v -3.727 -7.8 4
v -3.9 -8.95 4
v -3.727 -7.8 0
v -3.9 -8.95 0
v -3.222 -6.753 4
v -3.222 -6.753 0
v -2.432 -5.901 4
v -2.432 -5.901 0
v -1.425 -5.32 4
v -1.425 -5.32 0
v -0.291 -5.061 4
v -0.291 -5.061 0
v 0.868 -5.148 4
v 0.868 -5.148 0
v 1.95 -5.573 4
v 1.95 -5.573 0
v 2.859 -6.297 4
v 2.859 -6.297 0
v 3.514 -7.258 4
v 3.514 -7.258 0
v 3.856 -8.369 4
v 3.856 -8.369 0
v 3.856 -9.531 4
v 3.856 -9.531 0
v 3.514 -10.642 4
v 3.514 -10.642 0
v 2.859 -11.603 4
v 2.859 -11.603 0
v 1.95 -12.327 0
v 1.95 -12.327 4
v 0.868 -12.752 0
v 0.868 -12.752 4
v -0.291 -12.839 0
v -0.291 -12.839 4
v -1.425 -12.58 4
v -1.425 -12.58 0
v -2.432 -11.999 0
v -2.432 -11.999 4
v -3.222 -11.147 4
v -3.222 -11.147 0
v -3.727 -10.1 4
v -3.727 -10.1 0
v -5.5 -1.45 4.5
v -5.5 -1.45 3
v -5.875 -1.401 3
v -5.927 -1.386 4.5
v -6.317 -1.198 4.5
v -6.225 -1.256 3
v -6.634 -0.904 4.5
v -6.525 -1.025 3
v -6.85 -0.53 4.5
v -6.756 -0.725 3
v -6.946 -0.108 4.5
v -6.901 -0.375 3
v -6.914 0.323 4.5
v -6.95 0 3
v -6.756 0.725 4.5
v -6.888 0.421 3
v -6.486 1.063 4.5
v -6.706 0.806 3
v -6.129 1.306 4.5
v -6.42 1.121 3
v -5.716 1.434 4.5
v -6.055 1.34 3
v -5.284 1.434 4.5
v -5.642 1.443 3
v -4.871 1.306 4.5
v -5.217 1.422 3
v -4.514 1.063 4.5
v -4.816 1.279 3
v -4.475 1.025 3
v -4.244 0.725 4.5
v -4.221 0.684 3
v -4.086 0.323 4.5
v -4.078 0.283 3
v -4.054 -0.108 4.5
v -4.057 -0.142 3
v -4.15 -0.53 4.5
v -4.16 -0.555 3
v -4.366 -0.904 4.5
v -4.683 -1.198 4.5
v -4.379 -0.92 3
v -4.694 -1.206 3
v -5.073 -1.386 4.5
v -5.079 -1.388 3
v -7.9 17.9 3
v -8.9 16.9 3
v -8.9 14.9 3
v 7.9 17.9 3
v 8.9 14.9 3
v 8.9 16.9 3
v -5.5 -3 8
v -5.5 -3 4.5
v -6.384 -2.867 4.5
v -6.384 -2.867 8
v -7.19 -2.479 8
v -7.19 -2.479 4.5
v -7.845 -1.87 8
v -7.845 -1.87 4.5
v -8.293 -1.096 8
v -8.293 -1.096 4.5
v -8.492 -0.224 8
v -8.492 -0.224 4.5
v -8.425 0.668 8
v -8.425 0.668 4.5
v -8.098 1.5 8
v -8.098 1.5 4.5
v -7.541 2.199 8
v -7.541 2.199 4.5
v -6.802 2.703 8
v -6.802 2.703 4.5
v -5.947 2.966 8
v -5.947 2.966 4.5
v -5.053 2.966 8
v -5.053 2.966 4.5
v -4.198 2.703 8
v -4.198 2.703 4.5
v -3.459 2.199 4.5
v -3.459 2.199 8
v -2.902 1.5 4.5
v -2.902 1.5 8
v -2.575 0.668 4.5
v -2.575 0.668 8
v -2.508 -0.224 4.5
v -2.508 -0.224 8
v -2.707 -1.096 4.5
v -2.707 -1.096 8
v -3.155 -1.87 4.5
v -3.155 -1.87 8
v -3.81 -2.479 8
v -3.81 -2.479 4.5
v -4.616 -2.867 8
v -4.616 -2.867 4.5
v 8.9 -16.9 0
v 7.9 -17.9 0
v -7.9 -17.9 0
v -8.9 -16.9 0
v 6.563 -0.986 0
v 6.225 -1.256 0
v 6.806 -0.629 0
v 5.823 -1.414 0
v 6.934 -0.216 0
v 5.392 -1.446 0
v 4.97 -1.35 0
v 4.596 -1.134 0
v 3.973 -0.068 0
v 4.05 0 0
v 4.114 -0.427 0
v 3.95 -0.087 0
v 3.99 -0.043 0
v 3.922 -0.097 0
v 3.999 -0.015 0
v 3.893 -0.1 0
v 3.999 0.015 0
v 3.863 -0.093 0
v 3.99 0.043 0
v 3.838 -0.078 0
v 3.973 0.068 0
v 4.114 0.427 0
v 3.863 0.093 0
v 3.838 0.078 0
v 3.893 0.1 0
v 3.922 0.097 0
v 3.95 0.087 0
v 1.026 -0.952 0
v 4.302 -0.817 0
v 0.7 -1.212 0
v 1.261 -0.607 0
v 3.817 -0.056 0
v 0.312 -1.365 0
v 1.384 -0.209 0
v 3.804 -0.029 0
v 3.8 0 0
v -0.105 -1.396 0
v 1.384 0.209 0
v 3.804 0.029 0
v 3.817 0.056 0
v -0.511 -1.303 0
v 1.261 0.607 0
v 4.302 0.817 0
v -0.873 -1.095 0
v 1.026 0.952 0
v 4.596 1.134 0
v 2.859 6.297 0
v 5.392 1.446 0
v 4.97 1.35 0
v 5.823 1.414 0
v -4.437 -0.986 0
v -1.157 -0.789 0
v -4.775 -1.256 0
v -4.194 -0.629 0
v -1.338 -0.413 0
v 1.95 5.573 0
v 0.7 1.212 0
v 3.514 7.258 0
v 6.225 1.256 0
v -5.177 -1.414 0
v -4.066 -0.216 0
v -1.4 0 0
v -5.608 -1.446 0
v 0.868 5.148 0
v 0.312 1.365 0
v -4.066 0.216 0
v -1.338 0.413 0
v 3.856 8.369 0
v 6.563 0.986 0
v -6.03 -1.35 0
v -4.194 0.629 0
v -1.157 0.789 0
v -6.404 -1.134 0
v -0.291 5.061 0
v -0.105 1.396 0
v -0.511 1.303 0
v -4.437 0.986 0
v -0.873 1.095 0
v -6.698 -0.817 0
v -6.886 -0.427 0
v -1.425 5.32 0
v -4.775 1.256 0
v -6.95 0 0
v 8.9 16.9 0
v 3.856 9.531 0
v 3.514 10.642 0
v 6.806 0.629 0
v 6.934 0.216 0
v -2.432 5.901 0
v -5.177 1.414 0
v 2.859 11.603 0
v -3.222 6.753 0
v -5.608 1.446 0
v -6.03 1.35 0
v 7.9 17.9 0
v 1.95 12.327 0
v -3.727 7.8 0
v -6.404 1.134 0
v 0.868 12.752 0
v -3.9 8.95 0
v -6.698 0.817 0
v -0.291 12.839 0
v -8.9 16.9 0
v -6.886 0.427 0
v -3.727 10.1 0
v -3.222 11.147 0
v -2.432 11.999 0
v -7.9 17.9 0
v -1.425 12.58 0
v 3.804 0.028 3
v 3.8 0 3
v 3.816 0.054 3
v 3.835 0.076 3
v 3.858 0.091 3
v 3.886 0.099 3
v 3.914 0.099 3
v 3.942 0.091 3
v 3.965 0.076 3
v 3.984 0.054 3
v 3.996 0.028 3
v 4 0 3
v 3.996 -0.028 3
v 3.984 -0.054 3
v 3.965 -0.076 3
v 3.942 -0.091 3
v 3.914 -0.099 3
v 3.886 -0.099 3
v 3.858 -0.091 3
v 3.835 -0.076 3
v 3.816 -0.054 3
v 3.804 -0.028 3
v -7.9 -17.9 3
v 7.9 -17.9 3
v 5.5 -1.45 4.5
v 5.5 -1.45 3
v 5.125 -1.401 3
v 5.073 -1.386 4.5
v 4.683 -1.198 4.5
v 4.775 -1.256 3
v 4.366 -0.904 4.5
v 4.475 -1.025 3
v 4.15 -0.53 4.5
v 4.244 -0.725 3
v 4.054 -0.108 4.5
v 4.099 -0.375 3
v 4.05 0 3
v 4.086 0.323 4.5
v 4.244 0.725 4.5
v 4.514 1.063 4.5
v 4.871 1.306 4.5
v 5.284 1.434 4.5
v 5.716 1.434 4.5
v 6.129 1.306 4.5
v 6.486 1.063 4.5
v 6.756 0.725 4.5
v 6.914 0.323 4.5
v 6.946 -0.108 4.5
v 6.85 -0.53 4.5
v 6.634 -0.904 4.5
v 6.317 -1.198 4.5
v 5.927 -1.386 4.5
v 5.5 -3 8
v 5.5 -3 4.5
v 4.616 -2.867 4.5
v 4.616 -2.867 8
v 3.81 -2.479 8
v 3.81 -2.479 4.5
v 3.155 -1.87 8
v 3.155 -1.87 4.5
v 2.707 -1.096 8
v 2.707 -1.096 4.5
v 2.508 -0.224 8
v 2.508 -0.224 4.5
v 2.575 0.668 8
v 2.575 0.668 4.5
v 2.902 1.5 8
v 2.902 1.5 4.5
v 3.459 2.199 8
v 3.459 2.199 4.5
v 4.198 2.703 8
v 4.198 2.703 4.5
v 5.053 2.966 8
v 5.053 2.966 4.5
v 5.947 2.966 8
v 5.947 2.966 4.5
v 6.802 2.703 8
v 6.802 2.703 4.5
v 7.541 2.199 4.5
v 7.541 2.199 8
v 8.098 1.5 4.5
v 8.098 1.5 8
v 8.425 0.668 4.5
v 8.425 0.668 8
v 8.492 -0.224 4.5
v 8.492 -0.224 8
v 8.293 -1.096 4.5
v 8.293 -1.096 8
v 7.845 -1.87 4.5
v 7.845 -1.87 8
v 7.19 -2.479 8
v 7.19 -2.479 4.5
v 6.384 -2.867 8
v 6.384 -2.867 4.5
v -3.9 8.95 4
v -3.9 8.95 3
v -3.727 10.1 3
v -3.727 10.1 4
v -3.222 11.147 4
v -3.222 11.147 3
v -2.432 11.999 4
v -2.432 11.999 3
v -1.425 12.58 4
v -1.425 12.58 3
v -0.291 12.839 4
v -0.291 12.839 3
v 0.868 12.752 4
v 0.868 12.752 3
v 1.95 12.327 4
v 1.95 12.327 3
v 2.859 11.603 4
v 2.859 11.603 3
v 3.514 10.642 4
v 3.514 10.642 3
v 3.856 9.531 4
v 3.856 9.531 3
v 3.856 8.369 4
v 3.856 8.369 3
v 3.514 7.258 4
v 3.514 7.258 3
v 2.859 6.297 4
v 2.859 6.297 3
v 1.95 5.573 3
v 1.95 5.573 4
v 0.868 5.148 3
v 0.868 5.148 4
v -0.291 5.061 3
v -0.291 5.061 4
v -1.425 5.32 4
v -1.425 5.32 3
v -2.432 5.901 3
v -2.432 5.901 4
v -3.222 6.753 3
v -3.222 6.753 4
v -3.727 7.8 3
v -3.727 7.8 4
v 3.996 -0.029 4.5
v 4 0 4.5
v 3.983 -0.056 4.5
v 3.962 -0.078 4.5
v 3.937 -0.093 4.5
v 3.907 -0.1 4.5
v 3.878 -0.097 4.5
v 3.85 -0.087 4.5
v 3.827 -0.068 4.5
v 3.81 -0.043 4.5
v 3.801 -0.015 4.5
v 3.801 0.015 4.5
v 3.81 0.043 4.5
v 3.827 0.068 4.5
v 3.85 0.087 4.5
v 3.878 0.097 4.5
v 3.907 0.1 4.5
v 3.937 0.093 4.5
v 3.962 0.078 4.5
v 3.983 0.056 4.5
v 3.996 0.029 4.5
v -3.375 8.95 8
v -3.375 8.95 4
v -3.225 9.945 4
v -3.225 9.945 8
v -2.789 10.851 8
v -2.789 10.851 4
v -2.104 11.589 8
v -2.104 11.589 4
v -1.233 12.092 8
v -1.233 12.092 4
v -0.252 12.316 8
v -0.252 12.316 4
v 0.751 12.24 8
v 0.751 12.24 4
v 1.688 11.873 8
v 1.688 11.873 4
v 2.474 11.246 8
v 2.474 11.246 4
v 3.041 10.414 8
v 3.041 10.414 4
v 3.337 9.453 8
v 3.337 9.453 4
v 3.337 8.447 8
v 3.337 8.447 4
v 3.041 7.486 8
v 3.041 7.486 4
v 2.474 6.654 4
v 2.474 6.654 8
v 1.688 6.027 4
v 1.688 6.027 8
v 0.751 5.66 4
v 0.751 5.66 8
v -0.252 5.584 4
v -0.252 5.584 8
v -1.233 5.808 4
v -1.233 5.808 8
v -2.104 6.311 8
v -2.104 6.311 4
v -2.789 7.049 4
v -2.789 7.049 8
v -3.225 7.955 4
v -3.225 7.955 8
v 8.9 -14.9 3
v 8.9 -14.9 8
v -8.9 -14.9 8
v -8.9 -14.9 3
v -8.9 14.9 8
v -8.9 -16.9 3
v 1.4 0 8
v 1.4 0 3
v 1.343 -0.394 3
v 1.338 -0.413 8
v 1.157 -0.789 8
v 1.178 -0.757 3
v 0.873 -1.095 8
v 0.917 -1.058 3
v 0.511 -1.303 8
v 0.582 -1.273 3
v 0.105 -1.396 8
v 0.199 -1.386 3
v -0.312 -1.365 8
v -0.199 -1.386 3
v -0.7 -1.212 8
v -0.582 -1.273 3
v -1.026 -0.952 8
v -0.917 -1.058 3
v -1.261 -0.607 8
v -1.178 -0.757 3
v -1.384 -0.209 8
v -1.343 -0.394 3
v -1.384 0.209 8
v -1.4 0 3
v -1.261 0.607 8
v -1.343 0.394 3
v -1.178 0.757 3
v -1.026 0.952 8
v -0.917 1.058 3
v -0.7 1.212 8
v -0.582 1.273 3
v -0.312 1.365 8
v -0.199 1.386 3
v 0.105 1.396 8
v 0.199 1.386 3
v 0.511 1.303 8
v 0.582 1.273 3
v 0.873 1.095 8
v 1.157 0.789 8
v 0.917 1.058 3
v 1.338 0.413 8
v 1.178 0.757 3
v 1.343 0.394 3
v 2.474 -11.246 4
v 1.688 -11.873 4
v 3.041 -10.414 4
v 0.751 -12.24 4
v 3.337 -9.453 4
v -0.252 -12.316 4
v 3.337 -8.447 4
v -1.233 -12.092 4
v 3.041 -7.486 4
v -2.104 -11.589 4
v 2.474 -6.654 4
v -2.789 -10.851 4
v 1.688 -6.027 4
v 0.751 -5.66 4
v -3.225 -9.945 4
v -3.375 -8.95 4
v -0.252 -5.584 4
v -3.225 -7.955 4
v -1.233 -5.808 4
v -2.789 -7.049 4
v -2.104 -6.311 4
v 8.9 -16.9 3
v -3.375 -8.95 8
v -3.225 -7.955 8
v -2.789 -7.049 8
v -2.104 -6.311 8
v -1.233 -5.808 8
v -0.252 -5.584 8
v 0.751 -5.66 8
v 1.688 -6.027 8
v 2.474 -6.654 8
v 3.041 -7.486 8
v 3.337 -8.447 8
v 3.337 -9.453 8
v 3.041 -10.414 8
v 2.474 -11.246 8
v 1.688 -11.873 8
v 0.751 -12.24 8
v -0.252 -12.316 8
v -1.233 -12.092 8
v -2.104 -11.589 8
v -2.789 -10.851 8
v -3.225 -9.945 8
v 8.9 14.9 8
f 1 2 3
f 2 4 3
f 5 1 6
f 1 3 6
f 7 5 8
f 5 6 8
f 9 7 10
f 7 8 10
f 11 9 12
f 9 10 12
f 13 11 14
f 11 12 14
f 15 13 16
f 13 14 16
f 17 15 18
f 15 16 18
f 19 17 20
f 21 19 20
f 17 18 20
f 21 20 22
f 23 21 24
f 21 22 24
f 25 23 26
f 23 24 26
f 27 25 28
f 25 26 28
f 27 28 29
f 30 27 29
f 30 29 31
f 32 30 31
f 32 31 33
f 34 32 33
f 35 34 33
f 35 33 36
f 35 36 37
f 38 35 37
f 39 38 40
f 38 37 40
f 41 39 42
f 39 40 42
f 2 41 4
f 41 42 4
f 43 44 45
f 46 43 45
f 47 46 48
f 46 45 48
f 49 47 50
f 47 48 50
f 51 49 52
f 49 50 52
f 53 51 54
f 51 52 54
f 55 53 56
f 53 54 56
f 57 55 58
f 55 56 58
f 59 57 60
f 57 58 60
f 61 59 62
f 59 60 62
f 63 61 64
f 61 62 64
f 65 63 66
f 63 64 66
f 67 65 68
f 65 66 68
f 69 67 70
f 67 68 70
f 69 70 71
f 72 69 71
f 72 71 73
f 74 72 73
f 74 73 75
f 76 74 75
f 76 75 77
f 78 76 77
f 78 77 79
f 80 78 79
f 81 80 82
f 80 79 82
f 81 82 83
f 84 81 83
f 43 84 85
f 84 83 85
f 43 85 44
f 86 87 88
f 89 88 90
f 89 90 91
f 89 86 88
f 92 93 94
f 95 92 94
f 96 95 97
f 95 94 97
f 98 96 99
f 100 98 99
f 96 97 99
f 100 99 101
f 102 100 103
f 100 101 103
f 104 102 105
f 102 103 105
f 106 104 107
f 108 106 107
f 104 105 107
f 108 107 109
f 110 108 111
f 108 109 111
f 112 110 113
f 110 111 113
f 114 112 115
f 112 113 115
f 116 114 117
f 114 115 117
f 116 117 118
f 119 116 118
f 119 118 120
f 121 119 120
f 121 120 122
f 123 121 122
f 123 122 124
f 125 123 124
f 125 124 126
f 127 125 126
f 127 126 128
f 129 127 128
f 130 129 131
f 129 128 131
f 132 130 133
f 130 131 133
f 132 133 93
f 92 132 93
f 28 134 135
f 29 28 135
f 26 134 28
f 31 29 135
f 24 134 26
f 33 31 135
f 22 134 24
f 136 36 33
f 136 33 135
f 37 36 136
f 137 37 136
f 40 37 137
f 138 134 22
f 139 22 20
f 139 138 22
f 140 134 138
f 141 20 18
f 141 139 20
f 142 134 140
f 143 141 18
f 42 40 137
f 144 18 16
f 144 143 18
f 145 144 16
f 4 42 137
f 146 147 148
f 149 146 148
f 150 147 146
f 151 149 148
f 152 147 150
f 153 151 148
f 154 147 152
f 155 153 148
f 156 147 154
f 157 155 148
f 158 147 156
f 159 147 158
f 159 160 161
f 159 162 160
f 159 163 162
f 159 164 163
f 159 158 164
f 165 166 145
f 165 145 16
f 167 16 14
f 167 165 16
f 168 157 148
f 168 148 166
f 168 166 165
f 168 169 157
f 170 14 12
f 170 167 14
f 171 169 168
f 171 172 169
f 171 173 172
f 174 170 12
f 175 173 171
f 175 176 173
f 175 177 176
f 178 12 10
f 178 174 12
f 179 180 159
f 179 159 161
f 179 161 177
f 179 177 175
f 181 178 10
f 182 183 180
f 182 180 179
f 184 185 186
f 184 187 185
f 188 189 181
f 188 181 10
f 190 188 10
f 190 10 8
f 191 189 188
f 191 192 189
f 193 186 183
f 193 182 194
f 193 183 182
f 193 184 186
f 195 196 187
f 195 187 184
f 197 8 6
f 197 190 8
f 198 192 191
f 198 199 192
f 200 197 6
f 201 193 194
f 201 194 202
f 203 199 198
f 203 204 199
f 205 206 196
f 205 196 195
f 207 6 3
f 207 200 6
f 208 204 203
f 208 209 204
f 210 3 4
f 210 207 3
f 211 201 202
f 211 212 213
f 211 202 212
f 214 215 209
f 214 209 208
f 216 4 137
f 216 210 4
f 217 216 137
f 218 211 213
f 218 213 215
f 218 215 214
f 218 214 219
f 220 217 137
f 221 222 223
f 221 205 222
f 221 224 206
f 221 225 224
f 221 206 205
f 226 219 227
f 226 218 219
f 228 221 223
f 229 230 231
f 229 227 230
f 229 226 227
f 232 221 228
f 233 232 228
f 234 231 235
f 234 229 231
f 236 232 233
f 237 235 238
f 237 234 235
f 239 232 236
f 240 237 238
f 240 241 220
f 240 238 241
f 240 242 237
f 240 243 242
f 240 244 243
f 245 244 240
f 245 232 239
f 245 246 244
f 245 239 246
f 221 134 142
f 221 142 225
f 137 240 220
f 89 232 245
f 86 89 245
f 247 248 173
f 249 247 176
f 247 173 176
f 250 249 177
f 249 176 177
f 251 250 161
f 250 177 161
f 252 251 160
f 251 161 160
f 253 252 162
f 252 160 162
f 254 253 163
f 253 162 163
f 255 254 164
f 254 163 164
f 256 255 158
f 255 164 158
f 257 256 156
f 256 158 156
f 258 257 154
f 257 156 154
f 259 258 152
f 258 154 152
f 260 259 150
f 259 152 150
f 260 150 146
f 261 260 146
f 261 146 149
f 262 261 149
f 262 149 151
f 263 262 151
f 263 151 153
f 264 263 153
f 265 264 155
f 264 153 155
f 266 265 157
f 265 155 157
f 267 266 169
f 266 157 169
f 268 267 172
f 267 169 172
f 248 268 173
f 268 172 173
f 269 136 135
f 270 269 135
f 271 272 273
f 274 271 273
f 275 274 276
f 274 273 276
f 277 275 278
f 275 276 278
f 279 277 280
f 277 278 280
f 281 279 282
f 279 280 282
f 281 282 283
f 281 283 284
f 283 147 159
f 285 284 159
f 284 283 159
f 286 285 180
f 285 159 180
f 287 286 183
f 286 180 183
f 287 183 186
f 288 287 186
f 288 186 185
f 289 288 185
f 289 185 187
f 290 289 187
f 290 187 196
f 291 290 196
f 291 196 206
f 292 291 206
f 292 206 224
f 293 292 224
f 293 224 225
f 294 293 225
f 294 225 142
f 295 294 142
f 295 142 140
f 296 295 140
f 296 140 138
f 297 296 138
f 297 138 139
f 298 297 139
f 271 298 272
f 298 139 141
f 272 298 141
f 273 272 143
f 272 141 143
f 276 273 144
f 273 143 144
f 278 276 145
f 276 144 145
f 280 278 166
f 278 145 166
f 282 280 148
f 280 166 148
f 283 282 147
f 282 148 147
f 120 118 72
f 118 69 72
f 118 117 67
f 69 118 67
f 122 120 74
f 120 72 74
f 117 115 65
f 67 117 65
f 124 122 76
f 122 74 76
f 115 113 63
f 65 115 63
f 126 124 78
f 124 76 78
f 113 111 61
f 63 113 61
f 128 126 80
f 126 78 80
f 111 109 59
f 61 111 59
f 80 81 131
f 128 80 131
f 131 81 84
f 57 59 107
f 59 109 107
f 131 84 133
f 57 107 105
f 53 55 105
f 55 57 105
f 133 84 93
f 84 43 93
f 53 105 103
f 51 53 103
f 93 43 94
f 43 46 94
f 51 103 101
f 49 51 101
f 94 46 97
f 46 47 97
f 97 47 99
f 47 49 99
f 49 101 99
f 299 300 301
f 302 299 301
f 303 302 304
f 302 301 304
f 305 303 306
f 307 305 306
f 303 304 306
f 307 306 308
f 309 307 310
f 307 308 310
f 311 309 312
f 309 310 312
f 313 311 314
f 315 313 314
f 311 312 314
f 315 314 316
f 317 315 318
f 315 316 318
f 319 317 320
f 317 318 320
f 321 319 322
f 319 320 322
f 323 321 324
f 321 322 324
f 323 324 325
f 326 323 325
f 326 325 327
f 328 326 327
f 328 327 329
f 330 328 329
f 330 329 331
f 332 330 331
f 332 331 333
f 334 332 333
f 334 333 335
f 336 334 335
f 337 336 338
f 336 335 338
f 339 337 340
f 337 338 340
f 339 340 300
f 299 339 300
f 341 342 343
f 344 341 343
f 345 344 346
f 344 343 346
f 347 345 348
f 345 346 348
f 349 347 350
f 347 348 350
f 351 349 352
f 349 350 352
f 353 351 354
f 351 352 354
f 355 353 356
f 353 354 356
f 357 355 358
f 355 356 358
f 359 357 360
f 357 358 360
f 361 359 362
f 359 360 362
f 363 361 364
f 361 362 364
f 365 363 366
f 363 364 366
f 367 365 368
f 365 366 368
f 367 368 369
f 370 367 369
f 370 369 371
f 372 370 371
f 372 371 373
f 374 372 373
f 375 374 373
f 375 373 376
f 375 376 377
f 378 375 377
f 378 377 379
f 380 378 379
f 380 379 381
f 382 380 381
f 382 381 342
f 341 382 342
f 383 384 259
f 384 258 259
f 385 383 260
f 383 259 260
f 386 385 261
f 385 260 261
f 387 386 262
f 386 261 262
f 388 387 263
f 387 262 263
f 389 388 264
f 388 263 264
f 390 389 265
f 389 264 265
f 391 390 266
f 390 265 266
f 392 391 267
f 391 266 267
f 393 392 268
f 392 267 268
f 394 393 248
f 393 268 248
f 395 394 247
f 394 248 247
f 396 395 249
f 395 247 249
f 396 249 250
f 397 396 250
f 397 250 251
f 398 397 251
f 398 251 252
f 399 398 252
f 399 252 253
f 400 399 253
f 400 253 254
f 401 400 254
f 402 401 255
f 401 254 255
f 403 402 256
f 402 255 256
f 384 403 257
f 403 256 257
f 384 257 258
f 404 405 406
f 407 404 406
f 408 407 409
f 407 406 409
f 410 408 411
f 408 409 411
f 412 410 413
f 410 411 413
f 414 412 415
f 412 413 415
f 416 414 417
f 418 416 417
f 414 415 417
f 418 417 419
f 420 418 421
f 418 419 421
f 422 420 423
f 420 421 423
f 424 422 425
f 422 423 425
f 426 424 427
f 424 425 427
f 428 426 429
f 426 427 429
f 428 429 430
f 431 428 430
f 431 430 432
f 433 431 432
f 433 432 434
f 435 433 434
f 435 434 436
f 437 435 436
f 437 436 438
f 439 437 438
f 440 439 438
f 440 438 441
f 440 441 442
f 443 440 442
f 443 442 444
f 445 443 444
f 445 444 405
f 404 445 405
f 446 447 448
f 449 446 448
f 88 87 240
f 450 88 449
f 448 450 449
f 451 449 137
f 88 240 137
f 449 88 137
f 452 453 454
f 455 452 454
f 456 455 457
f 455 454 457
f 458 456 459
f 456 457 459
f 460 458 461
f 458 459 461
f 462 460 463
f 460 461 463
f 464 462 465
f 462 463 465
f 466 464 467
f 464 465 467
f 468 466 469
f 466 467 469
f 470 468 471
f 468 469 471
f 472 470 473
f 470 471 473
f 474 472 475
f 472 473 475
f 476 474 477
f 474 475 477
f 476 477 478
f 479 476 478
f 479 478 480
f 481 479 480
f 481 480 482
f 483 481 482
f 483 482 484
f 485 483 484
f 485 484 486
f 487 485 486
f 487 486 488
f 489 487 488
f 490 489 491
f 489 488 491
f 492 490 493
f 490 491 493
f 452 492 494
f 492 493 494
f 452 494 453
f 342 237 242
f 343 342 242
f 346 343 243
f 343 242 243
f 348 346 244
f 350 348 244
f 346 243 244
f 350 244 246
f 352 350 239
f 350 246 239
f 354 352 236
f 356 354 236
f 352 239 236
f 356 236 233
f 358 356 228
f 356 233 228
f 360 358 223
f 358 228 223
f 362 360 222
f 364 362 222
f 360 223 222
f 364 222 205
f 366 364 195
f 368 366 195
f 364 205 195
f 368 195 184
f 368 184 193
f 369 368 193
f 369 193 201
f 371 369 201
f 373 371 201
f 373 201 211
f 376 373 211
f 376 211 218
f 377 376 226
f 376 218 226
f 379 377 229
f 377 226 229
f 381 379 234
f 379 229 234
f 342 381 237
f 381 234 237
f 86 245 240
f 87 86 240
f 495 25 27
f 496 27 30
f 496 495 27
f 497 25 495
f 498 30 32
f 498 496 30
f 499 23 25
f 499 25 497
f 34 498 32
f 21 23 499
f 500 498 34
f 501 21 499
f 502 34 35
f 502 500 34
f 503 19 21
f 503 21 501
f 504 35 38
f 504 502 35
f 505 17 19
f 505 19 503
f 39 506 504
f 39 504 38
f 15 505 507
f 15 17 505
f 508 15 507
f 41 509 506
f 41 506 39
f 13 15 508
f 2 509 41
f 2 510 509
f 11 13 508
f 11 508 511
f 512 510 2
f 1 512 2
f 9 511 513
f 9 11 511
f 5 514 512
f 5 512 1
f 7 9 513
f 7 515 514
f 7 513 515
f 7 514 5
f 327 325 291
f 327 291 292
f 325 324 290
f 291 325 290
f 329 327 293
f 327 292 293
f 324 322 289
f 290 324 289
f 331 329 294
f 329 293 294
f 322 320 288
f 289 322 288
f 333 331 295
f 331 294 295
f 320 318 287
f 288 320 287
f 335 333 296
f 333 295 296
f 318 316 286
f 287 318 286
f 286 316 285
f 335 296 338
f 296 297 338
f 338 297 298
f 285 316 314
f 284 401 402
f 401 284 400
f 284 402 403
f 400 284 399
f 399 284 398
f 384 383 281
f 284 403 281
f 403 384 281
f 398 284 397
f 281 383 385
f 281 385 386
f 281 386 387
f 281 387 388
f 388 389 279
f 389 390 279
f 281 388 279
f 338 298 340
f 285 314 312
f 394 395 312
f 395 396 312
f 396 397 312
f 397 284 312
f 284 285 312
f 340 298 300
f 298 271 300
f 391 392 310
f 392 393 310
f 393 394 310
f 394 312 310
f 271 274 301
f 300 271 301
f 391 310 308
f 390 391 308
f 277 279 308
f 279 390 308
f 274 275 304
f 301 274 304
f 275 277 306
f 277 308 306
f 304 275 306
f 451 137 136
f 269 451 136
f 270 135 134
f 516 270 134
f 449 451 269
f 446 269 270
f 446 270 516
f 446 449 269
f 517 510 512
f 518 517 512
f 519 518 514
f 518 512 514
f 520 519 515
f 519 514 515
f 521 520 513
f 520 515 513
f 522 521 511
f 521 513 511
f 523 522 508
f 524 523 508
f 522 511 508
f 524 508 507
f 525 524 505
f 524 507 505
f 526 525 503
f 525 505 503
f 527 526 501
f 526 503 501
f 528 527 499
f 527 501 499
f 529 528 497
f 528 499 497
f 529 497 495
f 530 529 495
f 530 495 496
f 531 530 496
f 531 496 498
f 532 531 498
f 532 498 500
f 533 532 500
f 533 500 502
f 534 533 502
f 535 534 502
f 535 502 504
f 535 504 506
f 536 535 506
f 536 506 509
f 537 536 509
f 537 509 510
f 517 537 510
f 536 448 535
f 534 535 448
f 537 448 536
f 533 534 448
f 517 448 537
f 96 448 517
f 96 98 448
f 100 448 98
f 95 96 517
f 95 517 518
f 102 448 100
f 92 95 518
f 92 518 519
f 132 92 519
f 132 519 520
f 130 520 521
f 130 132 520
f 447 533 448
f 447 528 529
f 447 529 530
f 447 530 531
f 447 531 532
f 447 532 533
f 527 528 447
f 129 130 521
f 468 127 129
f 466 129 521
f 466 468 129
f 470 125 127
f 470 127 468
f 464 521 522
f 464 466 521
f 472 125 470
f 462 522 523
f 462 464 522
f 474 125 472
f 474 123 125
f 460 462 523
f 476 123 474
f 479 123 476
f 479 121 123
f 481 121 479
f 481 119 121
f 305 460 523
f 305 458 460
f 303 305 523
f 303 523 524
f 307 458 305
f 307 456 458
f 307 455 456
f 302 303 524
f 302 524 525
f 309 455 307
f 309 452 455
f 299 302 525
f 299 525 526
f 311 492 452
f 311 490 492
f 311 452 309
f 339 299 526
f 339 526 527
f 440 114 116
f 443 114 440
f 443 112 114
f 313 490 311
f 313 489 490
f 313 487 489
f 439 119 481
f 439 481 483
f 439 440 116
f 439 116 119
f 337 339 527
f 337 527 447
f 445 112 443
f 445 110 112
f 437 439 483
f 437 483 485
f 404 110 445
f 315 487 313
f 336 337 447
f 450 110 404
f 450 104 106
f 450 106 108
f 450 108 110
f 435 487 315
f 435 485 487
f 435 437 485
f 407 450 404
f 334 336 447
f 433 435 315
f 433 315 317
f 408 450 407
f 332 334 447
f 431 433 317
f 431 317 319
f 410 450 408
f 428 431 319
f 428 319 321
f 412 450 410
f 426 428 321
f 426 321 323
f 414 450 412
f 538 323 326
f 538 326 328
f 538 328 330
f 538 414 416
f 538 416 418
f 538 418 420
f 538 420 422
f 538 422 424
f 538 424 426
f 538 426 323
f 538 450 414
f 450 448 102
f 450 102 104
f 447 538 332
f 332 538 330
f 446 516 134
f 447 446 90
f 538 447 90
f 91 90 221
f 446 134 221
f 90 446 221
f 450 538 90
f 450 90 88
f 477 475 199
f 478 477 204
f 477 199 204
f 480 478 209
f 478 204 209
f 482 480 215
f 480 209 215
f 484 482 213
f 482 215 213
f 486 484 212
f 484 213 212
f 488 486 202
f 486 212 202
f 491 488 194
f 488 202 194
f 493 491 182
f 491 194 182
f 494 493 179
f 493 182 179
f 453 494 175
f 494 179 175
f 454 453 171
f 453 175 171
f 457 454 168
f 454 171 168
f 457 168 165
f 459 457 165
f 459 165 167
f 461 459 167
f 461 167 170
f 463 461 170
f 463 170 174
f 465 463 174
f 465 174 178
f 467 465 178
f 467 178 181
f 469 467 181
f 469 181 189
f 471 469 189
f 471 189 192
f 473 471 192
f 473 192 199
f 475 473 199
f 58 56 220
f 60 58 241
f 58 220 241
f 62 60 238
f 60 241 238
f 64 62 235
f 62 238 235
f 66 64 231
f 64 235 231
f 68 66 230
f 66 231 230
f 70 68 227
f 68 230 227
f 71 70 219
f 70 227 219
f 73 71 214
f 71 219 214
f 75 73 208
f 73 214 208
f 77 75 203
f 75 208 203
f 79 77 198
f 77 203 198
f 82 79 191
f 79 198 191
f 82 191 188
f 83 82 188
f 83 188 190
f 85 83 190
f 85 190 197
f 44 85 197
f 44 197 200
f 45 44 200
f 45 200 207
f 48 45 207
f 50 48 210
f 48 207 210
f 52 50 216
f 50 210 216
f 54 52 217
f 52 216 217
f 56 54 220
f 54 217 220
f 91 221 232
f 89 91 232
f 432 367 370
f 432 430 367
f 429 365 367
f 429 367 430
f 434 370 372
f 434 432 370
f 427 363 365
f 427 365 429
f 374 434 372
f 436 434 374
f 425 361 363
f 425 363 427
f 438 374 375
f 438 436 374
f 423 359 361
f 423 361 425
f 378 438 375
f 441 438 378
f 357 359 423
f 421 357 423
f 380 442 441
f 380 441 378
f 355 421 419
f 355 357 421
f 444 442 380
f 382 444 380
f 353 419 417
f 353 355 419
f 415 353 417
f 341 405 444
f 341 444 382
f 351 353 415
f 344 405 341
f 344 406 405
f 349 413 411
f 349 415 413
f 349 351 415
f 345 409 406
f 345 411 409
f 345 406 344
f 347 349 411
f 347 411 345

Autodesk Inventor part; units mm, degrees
ref_plane "Work Plane1" through (0, 0, 0) normal (0, 0, 1) x (1, 0, 0)
sketch "Sketch1" plane through (0, 0, 0) normal (0, 0, 1) x (1, 0, 0)
  circle A0 centre (0, -8.95) radius 4.2 projected
  circle A1 centre (0, 8.95) radius 4.2 projected
  circle A2 centre (0, 0) radius 1.4 projected
  circle A3 centre (3.9, 0) radius 0.1 projected
  line L0 (8.9, 16.9) -> (7.9, 17.9) projected
  line L1 (7.9, 17.9) -> (-7.9, 17.9) projected
  line L2 (-7.9, 17.9) -> (-8.9, 16.9) projected
  line L3 (-8.9, 16.9) -> (-8.9, -16.9) projected
  line L4 (-8.9, -16.9) -> (-7.9, -17.9) projected
  line L5 (-7.9, -17.9) -> (7.9, -17.9) projected
  line L6 (7.9, -17.9) -> (8.9, -16.9) projected
  line L7 (8.9, -16.9) -> (8.9, 16.9) projected
  point P0 (0, 0)
ref_plane "Work Plane2" through (-3.9, 5.05, 12.4) normal (0, 0, 1) x (1, 0, 0)
ref_plane "Work Plane3" through (-3.9, 5.05, 8) normal (0, 0, 1) x (1, 0, 0)
extrude "Extrusion1" add sketch "Sketch1" along normal up to surface (8 mm away) contours A0 | A1 | L7 L6 L5 L4 L3 L2 L1 L0
sketch "Sketch2" plane through (-7.9, 17.9, 8) normal (0, 0, 1) x (1, 0, 0)
  line L0 (16.8, -1) -> (16.8, -34.8) projected
  line L1 (15.8, 0) -> (16.8, -1) projected
  line L2 (0, 0) -> (15.8, 0) projected
  line L3 (-1, -1) -> (0, 0) projected
  line L4 (-1, -34.8) -> (-1, -1) projected
  line L5 (0, -35.8) -> (-1, -34.8) projected
  line L6 (15.8, -35.8) -> (0, -35.8) projected
  line L7 (16.8, -34.8) -> (15.8, -35.8) projected
  circle A0 centre (11.8, -17.9) radius 0.1 projected
  circle A1 centre (7.9, -17.9) radius 1.4 projected
  point P0 (7.9, -17.9)
  point P1 (13.4, -17.9)
  point P2 (2.4, -17.9)
  dimension "d2" = 5.5
  dimension "d3" = 5.5
hole "Hole1" at (5.5, 0, 8) at (-5.5, 0, 8) direction (0, 0, -1) diameter 2.9 end through all counterbore diameter 6 counterbore depth 3.5
sketch "Sketch3" plane through (0, 0, 0) normal (0, 0, -1) x (-1, 0, 0)
  circle A0 centre (0, 8.95) radius 3.9 construction
  circle A1 centre (0, -8.95) radius 3.9 construction
  circle A2 centre (0, 8.95) radius 3.375
  circle A3 centre (0, -8.95) radius 3.375
  point P0 (0, 0)
  dimension "d11" = 6.75
  dimension "d12" = 6.75
extrude "Extrusion2" cut sketch "Sketch3" against normal blind 10
sketch "Sketch4" plane through (0, 0, 0) normal (0, 0, -1) x (-1, 0, 0)
  circle A0 centre (0, 8.95) radius 3.375 projected
  circle A1 centre (0, -8.95) radius 3.375 projected
  circle A2 centre (0, 8.95) radius 3.9
  circle A3 centre (0, -8.95) radius 3.9
  point P0 (0, 0)
  dimension "d15" = 7.8
  dimension "d16" = 7.8
extrude "Extrusion3" cut sketch "Sketch4" against normal blind 4
sketch "Sketch5" plane through (0, 0, 0) normal (0, 0, -1) x (-1, 0, 0)
  circle A0 centre (0, 8.95) radius 3.9 projected
  circle A1 centre (0, 8.95) radius 3.9 projected
  circle A2 centre (0, -8.95) radius 3.9 projected
  circle A3 centre (-5.5, 0) radius 1.45 projected
  circle A4 centre (5.5, 0) radius 1.45 projected
  circle A5 centre (-3.9, 0) radius 0.1 projected
  line L0 (-8.9, 16.9) -> (-7.9, 17.9) projected
  line L1 (-8.9, -16.9) -> (-8.9, 16.9) projected
  line L2 (-7.9, -17.9) -> (-8.9, -16.9) projected
  line L3 (7.9, -17.9) -> (-7.9, -17.9) projected
  line L4 (8.9, -16.9) -> (7.9, -17.9) projected
  line L5 (8.9, 16.9) -> (8.9, -16.9) projected
  line L6 (7.9, 17.9) -> (8.9, 16.9) projected
  line L7 (-7.9, 17.9) -> (7.9, 17.9) projected
  line L8 (7.4, -16.2787) -> (7.2787, -16.4)
  line L9 (7.2787, -16.4) -> (-7.2787, -16.4)
  line L10 (-7.2787, -16.4) -> (-7.4, -16.2787)
  line L11 (-7.4, -16.2787) -> (-7.4, 16.2787)
  line L12 (-7.4, 16.2787) -> (-7.2787, 16.4)
  line L13 (-7.2787, 16.4) -> (7.2787, 16.4)
  line L14 (7.2787, 16.4) -> (7.4, 16.2787)
  line L15 (7.4, 16.2787) -> (7.4, -16.2787)
  point P0 (0, 0)
  dimension "d19" = 1.5
extrude "Extrusion4" cut sketch "Sketch5" against normal blind 3 contours A0 | A2 | A3 | A4 | L8 L9 L10 L11 L12 L13 L14 L15
ref_plane "Work Plane4" through (-13.9917, -57.9, 3) normal (0, 0, 1) x (1, 0, 0)
sketch "Sketch6" plane through (-7.9, 17.9, 8) normal (0, 0, 1) x (1, 0, 0)
  circle A0 centre (7.9, -8.95) radius 3.375 projected
  circle A1 centre (7.9, -26.85) radius 3.375 projected
  circle A2 centre (2.4, -17.9) radius 3 projected
  circle A3 centre (13.4, -17.9) radius 3 projected
  line L0 (16.8, -1) -> (16.8, -34.8) projected
  line L1 (15.8, 0) -> (16.8, -1) projected
  line L2 (0, 0) -> (15.8, 0) projected
  line L3 (-1, -1) -> (0, 0) projected
  line L4 (-1, -34.8) -> (-1, -1) projected
  line L5 (0, -35.8) -> (-1, -34.8) projected
  line L6 (15.8, -35.8) -> (0, -35.8) projected
  line L7 (16.8, -34.8) -> (15.8, -35.8) projected
  line L8 (16.8, -34.8) -> (16.8, -1) projected
  line L9 (-1, 0) -> (16.8, 0)
  line L10 (16.8, 0) -> (16.8, -3)
  line L11 (16.8, -3) -> (-1, -3)
  line L12 (-1, -3) -> (-1, 0)
  line L13 (-1, -35.8) -> (16.8, -35.8)
  line L14 (16.8, -35.8) -> (16.8, -32.8)
  line L15 (16.8, -32.8) -> (-1, -32.8)
  line L16 (-1, -32.8) -> (-1, -35.8)
  point P0 (7.9, -17.9)
  dimension "d22" = 3
  dimension "d23" = 3
extrude "Extrusion5" cut sketch "Sketch6" against normal up to surface (5 mm away) contours L0 L11 L4 L3 L2 L1 | L1 L9 L10 | L0 L7 L6 L5 L4 L15 | L3 L12 L9 | L14 L13 L7 | L5 L13 L16
sketch "Sketch7" plane through (0, 0, 0) normal (0, 0, -1) x (-1, 0, 0)
  line L0 (7.4, 16.2787) -> (7.4, -16.2787) projected
  line L1 (7.4, -16.2787) -> (7.2787, -16.4) projected
  line L2 (7.2787, -16.4) -> (-7.2787, -16.4) projected
  line L3 (-7.2787, -16.4) -> (-7.4, -16.2787) projected
  line L4 (-7.4, -16.2787) -> (-7.4, 16.2787) projected
  line L5 (-7.4, 16.2787) -> (-7.2787, 16.4) projected
  line L6 (-7.2787, 16.4) -> (7.2787, 16.4) projected
  line L7 (7.2787, 16.4) -> (7.4, 16.2787) projected
  line L8 (-8.9, 16.9) -> (-7.9, 17.9) projected
  line L9 (-8.9, -16.9) -> (-8.9, 16.9) projected
  line L10 (-7.9, -17.9) -> (-8.9, -16.9) projected
  line L11 (7.9, -17.9) -> (-7.9, -17.9) projected
  line L12 (8.9, -16.9) -> (7.9, -17.9) projected
  line L13 (8.9, 16.9) -> (8.9, -16.9) projected
  line L14 (7.9, 17.9) -> (8.9, 16.9) projected
  line L15 (-7.9, 17.9) -> (7.9, 17.9) projected
  line L16 (7.4, 14.9) -> (7.4, -14.9) projected
  line L17 (7.4, 13.4) -> (-7.4, 13.4)
  line L18 (-7.4, 13.4) -> (-7.4, 16.4)
  line L19 (-7.4, 16.4) -> (7.4, 16.4)
  line L20 (7.4, 16.4) -> (7.4, 13.4)
  line L21 (7.4, -13.4) -> (-7.4, -13.4)
  line L22 (-7.4, -13.4) -> (-7.4, -16.4)
  line L23 (-7.4, -16.4) -> (7.4, -16.4)
  line L24 (7.4, -16.4) -> (7.4, -13.4)
  point P0 (0, 0)
  dimension "d26" = 3
  dimension "d27" = 3
extrude "Extrusion6" add sketch "Sketch7" against normal up to surface (3 mm away) contours L0 L17 L4 L5 L6 L7 | L5 L18 L19 | L0 L1 L2 L3 L4 L21 | L24 L23 L1 | L3 L23 L22
sketch "Sketch8" plane through (0, 0, 0) normal (0, 0, -1) x (-1, 0, 0)
  line L0 (7.4, 13.4) -> (-7.4, 13.4) projected
  line L1 (-7.4, -13.4) -> (-7.4, 13.4) projected
  line L2 (-7.4, -13.4) -> (7.4, -13.4) projected
  line L3 (7.4, 13.4) -> (7.4, -13.4) projected
  circle A0 centre (0, 8.95) radius 3.9 projected
  circle A1 centre (0, -8.95) radius 3.9 projected
  circle A2 centre (-5.5, 0) radius 1.45 projected
  circle A3 centre (5.5, 0) radius 1.45 projected
  circle A4 centre (0, 0) radius 1.4 projected
  circle A5 centre (-3.9, 0) radius 0.1 projected
  point P0 (0, 0)
extrude "Extrusion7" add sketch "Sketch8" against normal up to surface (3 mm away)
properties part number "Omnivision_Objectivelens_mount"
